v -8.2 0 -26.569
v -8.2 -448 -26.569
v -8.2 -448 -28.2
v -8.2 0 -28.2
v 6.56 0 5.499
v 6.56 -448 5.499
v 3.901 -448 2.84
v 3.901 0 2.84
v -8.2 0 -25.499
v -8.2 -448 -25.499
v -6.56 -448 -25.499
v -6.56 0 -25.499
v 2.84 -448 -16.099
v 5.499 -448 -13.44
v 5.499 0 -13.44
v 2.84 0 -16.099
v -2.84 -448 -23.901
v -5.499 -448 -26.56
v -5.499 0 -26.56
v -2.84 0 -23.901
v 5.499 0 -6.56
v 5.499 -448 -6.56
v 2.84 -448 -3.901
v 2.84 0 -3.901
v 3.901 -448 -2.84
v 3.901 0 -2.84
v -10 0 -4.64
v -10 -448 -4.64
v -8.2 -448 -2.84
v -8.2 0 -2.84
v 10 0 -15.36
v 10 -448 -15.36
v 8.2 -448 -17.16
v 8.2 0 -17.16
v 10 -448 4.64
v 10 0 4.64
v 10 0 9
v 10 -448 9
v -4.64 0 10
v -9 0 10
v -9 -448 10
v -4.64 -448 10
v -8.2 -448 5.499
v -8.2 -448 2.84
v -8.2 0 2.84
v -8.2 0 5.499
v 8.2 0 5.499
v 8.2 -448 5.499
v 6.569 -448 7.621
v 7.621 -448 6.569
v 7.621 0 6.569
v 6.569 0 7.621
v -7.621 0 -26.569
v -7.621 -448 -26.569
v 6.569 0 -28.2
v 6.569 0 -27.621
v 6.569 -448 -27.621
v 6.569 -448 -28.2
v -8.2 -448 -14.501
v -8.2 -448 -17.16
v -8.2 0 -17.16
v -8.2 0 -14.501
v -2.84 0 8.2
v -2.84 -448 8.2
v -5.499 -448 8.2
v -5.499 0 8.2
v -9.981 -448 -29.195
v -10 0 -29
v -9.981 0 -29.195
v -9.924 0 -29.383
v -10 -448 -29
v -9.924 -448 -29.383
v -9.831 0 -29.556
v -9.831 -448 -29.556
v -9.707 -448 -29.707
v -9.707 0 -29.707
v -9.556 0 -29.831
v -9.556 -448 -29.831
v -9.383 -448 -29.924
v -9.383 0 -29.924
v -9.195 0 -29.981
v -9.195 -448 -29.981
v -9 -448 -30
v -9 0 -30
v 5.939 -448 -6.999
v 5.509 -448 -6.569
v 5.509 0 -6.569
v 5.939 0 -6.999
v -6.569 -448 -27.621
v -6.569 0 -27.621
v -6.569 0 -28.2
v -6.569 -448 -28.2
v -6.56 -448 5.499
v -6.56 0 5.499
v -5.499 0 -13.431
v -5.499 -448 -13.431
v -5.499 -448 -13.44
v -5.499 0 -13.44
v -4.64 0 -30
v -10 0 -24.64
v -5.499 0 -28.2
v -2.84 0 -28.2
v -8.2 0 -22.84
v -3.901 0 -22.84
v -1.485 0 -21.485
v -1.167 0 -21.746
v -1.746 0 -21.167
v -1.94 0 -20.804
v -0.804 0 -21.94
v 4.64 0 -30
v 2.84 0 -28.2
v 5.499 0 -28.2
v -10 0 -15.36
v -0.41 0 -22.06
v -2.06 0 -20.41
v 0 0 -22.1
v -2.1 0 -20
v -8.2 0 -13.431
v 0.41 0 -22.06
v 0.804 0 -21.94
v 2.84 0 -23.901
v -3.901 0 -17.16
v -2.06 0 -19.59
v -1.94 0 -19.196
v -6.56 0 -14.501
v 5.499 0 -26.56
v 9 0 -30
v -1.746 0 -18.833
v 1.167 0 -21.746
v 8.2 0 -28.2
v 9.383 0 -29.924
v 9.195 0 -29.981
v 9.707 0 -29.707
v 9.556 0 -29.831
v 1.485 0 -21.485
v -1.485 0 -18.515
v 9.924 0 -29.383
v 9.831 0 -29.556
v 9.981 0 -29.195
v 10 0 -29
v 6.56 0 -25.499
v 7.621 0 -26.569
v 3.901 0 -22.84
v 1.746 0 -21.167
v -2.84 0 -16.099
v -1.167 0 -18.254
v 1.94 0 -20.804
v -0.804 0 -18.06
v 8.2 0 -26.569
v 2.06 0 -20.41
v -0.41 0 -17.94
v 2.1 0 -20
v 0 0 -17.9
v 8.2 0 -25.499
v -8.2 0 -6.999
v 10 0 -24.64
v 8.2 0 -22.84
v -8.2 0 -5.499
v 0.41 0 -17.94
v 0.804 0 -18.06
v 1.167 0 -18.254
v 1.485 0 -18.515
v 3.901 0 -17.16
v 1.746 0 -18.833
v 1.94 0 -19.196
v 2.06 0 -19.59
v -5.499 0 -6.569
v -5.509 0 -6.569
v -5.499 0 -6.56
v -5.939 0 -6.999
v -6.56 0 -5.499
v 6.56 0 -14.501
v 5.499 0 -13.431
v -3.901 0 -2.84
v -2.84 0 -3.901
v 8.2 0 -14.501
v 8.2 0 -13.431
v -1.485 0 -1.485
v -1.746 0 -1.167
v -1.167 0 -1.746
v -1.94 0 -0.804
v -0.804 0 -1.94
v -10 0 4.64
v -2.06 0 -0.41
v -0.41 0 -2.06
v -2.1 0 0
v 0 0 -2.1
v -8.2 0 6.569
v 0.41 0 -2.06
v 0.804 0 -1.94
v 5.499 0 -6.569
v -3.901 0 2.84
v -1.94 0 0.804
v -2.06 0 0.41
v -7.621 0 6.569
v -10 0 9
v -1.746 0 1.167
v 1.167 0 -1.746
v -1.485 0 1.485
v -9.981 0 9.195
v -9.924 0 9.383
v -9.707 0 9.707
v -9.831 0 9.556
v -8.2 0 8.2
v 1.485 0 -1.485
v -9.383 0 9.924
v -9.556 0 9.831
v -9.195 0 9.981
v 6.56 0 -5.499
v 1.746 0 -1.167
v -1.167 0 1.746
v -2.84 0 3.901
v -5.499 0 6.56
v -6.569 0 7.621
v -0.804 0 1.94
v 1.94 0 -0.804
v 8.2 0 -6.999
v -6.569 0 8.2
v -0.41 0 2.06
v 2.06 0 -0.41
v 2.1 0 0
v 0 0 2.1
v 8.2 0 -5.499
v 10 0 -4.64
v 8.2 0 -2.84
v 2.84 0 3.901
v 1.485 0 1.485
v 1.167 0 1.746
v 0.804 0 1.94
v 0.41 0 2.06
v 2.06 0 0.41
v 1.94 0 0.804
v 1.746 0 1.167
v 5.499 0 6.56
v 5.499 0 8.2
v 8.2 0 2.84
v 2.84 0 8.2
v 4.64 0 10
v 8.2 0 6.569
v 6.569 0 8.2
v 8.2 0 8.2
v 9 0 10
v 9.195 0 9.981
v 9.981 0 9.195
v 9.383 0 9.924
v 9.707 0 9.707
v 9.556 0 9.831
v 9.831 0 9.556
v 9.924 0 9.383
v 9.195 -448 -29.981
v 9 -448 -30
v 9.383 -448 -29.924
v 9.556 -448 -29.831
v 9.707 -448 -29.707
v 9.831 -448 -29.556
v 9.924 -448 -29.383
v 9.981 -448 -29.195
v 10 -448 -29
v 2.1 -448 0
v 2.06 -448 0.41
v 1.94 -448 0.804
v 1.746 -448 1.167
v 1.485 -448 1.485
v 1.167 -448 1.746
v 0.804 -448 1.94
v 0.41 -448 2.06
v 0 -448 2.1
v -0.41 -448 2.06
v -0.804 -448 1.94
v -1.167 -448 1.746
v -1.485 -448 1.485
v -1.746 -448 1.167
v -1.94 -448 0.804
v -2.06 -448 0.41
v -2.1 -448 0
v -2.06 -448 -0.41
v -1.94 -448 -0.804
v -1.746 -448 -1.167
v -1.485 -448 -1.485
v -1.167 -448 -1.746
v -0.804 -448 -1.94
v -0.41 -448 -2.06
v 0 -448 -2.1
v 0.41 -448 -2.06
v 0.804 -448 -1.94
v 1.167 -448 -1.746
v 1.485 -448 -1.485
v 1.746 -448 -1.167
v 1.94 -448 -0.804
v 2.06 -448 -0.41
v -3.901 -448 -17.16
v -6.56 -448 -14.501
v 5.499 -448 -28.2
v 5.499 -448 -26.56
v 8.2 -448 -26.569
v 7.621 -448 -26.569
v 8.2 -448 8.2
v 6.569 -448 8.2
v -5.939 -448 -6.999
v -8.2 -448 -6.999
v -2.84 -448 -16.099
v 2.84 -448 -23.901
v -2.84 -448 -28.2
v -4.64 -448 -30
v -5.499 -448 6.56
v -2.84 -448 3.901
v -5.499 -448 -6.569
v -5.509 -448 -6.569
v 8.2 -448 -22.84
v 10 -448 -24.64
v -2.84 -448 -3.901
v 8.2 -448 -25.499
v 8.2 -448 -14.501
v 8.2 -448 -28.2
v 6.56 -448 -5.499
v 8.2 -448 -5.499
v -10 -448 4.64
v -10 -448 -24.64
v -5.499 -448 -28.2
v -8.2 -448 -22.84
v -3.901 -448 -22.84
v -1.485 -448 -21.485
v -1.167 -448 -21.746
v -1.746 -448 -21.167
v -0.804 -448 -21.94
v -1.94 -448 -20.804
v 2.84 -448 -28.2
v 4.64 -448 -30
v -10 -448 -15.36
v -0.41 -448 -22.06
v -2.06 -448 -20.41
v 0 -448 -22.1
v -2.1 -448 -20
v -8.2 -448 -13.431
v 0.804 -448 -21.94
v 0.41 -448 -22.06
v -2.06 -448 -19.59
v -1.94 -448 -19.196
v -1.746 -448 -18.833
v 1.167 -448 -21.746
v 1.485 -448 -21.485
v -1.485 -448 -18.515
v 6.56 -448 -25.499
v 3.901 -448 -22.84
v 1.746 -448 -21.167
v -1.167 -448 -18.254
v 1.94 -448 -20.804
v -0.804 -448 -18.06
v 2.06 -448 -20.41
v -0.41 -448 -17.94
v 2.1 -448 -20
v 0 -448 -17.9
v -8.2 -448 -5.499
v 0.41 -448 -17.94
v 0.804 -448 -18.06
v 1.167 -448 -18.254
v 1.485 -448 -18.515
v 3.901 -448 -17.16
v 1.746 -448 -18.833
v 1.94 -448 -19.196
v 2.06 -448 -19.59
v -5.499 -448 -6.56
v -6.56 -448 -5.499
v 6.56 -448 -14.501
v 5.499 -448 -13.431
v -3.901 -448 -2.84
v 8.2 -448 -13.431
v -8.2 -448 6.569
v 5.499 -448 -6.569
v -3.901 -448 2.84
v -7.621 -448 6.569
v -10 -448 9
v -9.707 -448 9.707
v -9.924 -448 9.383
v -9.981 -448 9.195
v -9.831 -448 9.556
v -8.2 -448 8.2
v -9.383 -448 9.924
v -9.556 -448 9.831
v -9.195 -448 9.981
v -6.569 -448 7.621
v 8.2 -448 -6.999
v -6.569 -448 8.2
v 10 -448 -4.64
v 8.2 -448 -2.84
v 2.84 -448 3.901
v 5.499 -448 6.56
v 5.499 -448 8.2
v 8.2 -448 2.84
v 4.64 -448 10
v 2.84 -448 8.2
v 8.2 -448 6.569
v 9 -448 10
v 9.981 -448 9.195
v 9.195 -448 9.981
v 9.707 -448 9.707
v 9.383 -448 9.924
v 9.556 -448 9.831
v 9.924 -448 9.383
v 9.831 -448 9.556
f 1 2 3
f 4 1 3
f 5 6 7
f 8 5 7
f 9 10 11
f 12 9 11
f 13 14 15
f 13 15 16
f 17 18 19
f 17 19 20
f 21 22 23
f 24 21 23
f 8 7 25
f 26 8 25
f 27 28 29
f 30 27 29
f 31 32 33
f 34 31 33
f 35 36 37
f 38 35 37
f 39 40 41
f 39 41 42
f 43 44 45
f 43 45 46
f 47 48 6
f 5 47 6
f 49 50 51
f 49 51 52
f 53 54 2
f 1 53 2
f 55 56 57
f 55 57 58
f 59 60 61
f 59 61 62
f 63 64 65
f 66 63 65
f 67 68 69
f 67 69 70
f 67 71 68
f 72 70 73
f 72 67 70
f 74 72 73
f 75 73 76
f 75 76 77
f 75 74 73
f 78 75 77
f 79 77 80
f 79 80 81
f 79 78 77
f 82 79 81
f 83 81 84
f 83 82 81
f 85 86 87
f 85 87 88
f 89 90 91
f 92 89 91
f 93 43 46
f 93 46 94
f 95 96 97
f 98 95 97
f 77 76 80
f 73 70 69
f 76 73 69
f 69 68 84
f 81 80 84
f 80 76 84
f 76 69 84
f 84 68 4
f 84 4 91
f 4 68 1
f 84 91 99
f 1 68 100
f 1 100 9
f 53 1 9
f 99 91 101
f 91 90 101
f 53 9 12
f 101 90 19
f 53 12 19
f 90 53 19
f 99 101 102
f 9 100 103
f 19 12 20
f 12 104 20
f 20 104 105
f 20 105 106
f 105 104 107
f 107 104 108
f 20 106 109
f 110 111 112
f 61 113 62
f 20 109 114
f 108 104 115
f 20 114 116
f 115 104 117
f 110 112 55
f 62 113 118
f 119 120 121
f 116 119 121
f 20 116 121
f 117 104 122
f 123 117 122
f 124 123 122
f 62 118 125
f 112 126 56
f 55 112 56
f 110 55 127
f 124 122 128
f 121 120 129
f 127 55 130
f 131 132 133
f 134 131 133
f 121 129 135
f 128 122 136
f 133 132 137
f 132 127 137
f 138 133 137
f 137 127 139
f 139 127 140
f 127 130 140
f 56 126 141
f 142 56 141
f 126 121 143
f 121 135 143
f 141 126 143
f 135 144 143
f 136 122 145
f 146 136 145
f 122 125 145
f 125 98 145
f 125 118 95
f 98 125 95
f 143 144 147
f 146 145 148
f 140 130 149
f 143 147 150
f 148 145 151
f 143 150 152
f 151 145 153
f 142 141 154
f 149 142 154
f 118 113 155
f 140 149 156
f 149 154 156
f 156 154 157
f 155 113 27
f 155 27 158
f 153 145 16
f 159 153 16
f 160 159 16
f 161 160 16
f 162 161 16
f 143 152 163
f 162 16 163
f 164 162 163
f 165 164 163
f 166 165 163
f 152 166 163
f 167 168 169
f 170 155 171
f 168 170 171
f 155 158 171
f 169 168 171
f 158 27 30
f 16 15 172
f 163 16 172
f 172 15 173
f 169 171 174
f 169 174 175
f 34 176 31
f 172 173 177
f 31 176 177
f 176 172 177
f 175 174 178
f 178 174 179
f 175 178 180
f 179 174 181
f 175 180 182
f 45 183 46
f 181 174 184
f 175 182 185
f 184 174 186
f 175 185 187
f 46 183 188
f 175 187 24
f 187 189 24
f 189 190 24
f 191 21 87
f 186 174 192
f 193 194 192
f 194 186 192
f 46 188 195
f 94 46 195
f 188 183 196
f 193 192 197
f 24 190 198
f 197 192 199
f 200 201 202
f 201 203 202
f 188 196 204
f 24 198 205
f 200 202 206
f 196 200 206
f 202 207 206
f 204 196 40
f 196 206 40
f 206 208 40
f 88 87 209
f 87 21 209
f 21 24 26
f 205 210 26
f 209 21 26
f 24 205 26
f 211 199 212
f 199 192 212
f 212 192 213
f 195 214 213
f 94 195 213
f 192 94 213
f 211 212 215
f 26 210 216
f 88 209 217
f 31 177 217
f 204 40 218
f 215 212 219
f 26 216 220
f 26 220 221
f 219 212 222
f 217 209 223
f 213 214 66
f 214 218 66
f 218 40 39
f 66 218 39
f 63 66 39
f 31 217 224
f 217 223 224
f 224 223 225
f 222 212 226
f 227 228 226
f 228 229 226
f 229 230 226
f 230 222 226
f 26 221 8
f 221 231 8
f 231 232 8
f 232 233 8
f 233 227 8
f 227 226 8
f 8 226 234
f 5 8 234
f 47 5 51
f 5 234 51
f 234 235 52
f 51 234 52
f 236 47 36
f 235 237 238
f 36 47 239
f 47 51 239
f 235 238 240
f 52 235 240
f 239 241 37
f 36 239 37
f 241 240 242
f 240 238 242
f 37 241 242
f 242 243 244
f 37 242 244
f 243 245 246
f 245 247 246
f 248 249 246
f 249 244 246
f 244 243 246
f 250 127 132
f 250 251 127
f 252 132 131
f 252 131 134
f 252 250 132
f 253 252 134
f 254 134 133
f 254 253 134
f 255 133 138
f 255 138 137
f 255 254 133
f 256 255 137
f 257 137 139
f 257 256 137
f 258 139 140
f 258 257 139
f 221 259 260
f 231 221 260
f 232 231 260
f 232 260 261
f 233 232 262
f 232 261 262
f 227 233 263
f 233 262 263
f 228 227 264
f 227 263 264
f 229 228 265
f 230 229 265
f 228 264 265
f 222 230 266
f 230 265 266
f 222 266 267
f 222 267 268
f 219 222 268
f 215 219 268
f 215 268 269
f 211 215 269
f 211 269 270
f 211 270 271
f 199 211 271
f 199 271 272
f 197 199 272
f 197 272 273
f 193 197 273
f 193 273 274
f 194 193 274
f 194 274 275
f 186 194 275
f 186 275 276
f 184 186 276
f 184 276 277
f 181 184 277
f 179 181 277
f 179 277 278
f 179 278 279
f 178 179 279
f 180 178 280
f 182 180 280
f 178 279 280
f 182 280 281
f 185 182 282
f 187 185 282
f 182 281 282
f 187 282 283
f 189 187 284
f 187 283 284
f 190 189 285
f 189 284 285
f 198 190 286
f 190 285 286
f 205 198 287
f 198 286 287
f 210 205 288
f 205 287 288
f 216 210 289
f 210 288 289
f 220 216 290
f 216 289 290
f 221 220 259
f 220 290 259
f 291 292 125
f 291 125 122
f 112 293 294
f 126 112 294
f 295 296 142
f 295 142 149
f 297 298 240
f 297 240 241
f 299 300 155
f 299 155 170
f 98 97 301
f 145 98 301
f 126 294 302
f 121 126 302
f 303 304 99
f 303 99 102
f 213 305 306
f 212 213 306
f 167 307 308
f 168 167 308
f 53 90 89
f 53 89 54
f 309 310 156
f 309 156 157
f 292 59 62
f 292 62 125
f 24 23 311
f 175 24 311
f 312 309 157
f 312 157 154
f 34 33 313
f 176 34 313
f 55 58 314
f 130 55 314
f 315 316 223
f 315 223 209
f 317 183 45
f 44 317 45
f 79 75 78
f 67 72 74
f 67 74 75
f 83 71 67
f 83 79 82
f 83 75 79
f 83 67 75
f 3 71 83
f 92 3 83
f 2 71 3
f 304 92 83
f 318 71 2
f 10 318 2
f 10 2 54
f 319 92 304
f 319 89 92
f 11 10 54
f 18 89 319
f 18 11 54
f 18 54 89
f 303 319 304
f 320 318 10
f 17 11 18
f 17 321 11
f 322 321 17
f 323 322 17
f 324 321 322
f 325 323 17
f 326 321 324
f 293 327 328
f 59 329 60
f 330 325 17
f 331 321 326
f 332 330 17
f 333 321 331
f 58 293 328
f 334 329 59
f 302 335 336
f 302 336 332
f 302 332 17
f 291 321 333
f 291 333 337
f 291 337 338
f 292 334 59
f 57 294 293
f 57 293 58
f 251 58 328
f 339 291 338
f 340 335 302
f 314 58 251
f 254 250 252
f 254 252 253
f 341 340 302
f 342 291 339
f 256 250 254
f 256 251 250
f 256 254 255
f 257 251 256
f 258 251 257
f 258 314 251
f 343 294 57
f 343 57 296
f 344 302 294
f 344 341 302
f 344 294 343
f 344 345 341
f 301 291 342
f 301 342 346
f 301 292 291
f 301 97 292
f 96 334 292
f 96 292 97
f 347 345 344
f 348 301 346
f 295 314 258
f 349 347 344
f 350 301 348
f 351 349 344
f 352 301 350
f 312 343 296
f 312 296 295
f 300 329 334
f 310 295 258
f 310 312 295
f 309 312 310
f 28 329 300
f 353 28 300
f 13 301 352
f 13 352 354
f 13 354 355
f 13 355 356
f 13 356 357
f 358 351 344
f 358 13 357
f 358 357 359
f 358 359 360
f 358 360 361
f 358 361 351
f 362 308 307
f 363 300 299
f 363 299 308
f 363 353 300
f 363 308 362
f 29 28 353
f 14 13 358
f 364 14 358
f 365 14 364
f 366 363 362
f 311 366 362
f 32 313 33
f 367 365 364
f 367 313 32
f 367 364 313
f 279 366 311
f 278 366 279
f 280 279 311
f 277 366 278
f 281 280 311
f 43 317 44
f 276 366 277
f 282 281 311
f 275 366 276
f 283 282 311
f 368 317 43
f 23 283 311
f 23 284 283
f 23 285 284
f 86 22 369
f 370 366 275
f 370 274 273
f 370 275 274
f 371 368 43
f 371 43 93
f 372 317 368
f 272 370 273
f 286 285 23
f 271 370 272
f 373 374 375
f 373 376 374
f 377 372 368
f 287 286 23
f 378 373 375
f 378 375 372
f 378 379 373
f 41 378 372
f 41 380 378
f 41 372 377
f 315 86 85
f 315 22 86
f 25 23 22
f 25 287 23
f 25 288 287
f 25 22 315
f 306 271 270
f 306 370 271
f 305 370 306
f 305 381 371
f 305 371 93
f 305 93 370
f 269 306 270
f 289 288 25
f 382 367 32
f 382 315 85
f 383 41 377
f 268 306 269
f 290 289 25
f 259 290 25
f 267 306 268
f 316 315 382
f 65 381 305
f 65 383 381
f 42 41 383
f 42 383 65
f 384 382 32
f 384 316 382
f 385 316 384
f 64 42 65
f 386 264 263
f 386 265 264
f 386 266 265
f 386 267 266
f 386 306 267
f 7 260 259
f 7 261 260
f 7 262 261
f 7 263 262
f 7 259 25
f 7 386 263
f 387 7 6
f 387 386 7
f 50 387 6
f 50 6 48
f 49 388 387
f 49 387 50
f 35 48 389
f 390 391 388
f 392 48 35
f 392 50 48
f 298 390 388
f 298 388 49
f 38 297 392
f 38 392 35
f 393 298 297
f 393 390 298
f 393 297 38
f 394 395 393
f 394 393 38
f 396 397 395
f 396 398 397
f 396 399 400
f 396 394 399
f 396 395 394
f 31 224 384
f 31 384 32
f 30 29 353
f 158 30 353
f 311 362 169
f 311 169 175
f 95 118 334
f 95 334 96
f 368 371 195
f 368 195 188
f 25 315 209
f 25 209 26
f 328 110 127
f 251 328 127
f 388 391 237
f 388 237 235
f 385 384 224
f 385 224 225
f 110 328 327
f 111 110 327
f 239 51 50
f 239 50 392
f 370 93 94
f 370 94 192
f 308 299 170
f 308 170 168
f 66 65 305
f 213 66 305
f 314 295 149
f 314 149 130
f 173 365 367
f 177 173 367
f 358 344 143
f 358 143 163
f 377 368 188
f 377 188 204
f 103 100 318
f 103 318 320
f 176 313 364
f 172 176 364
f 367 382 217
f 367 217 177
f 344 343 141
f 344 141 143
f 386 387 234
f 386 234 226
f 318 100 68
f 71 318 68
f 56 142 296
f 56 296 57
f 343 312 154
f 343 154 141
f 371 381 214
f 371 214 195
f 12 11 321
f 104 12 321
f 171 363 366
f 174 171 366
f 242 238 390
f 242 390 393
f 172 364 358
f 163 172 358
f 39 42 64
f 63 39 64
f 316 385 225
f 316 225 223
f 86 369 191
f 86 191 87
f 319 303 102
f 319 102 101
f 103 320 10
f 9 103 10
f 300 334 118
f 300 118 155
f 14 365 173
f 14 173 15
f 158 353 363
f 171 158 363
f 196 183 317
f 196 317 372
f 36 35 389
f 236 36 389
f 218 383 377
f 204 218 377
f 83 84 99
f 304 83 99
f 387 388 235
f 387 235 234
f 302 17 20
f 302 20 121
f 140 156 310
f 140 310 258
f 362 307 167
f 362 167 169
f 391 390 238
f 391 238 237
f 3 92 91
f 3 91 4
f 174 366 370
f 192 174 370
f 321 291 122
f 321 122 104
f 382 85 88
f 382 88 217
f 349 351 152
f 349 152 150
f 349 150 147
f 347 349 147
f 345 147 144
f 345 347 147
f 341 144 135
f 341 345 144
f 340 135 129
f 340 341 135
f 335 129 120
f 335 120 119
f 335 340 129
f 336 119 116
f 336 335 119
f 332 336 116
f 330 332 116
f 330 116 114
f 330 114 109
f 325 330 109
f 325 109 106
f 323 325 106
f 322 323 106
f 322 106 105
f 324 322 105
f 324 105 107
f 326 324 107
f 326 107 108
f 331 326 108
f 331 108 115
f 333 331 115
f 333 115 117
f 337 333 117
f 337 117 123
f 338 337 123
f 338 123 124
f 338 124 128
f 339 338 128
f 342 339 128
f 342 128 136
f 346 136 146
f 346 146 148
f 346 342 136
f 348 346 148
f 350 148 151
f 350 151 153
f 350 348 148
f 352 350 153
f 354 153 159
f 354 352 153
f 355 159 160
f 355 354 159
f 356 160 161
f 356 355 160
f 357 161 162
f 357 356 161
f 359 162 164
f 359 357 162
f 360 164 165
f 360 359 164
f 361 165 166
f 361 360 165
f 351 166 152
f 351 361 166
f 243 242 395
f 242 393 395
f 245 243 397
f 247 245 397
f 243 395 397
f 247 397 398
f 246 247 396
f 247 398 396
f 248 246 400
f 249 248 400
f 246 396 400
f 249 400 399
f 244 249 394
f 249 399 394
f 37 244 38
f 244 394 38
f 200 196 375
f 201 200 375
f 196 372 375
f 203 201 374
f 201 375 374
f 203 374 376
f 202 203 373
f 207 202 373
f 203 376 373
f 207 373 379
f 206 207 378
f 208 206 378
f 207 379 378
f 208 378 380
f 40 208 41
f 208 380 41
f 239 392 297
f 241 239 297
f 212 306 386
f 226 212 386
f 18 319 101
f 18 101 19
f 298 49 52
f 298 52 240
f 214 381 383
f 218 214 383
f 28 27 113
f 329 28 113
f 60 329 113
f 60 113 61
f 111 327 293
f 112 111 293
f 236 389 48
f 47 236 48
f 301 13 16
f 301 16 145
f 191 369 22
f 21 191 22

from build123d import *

# Parameters (mm, degrees)
F0_W             = 20
F0_H             = 20
F1_DEPTH         = 448
F2_R             = 2.1
F3_DEPTH         = 448.001
F4_R             = 1
F6_DEPTH         = 448.001
F6_COPIES3_COUNT = 2
F6_COPIES3_ANGLE = 90
F6_COPIES4_COUNT = 2
F6_COPIES4_ANGLE = 270
F6_COPIES6_COUNT = 2
F9_W             = 16.4
F9_H             = 6.8613203436
F10_DEPTH        = 448.001
F12_DEPTH        = 448


# Not quite as in the source:
# - a pattern or mirror of a feature is missing from the dataset's text; its kind, count and spacing are read off the source's solid


with BuildPart() as f1:
    # F0 (on Front) → F1 (new body)
    with BuildSketch(Plane.XZ):
        Rectangle(F0_W, F0_H)
    extrude(amount=F1_DEPTH)

    # F2 (on face) → F3 (cut, through all)
    with BuildSketch(Plane.XZ.offset(448)):
        Circle(F2_R)
    extrude(amount=-F3_DEPTH, mode=Mode.SUBTRACT)

    # F4
    f4_edges = [f1.edges().sort_by_distance(p)[0] for p in [
        (-10, -224, 10),
        (10, -224, 10),
    ]]
    fillet(f4_edges, radius=F4_R)

    # F5 (on face) → F6 (cut, through all)
    with BuildSketch(Plane.XZ.offset(448)):
        Polygon((0, 3.9006601718), (0, 10), (-2.84, 10), (-4.64, 10), (-2.84, 8.2), (-5.4993398282, 8.2), (-5.4993398282, 6.56), (-2.84, 3.9006601718), align=None)
        Polygon((-6.5693398282, 8.2), (-8.2, 8.2), (-7.0953059148, 7.0953059148), (-6.5693398282, 7.6212720014), align=None)
    f6 = extrude(amount=-F6_DEPTH, mode=Mode.SUBTRACT)

    # F6_copies: F6 across plane
    add(f6.mirror(Plane(origin=(0, 0, 0), x_dir=(-0.7071067812, 0, -0.7071067812), z_dir=(0.7071067812, 0, -0.7071067812))), mode=Mode.SUBTRACT)

    # F6_copies1: F6 across plane
    add(f6.mirror(Plane(origin=(0, 0, 0), x_dir=(0.7071067812, 0, -0.7071067812), z_dir=(-0.7071067812, 0, -0.7071067812))), mode=Mode.SUBTRACT)

    # F6_copies2: F6 across plane
    add(f6.mirror(Plane(origin=(0, 0, 0), x_dir=(0, 0, 1), z_dir=(1, 0, 0))), mode=Mode.SUBTRACT)

    # F6_copies3: F6 ×2 about axis
    f6_copies3_axis = Axis((0, 0, 0), (0, 1, 0))
    for i in range(1, F6_COPIES3_COUNT):
        add(f6.rotate(f6_copies3_axis, i * F6_COPIES3_ANGLE / (F6_COPIES3_COUNT - 1)), mode=Mode.SUBTRACT)

    # F6_copies4: F6 ×2 about axis
    f6_copies4_axis = Axis((0, 0, 0), (0, 1, 0))
    for i in range(1, F6_COPIES4_COUNT):
        add(f6.rotate(f6_copies4_axis, i * F6_COPIES4_ANGLE / (F6_COPIES4_COUNT - 1)), mode=Mode.SUBTRACT)

    # F6_copies5: F6 across plane
    add(f6.mirror(Plane(origin=(0, 0, 0), x_dir=(-1, 0, 0), z_dir=(0, 0, -1))), mode=Mode.SUBTRACT)

    # F6_copies6: F6 ×2 about axis
    f6_copies6_axis = Axis((0, 0, 0), (0, 1, 0))
    for i in range(1, F6_COPIES6_COUNT):
        add(f6.rotate(f6_copies6_axis, i * 360 / F6_COPIES6_COUNT), mode=Mode.SUBTRACT)

    # F8: F1 across face


with BuildPart() as f1_1:
    add(f1.part)
    add(f1.part.mirror(Plane(origin=(-7.32, -224, -10), x_dir=(1, 0, 0), z_dir=(0, 0, -1))))

    # F9 (on face) → F10 (cut, through all)
    with BuildSketch(Plane.XZ.offset(448)):
        with Locations((0, -10)):
            Rectangle(F9_W, F9_H)
    extrude(amount=-F10_DEPTH, mode=Mode.SUBTRACT)

    # F11 (on face) → F12 (join, through all)
    with BuildSketch(Plane.XZ.offset(448)):
        with BuildLine():
            ThreePointArc((-9, -10), (-9.7071067812, -9.7071067812), (-10, -9))
            Line((-10, -9), (-10, -11))
            ThreePointArc((-10, -11), (-9.7071067812, -10.2928932188), (-9, -10))
        make_face()
        with BuildLine():
            ThreePointArc((10, -9), (9.7071067812, -9.7071067812), (9, -10))
            ThreePointArc((9, -10), (9.7071067812, -10.2928932188), (10, -11))
            Line((10, -11), (10, -9))
        make_face()
        Polygon((5.9386796564, -6.9993398282), (8.2, -6.9993398282), (8.2, -6.5693398282), (5.5086796564, -6.5693398282), align=None)
        Polygon((-8.2, -6.5693398282), (-8.2, -6.9993398282), (-5.9386796564, -6.9993398282), (-5.5086796564, -6.5693398282), align=None)
    extrude(amount=-F12_DEPTH)


solid = f1_1.part
